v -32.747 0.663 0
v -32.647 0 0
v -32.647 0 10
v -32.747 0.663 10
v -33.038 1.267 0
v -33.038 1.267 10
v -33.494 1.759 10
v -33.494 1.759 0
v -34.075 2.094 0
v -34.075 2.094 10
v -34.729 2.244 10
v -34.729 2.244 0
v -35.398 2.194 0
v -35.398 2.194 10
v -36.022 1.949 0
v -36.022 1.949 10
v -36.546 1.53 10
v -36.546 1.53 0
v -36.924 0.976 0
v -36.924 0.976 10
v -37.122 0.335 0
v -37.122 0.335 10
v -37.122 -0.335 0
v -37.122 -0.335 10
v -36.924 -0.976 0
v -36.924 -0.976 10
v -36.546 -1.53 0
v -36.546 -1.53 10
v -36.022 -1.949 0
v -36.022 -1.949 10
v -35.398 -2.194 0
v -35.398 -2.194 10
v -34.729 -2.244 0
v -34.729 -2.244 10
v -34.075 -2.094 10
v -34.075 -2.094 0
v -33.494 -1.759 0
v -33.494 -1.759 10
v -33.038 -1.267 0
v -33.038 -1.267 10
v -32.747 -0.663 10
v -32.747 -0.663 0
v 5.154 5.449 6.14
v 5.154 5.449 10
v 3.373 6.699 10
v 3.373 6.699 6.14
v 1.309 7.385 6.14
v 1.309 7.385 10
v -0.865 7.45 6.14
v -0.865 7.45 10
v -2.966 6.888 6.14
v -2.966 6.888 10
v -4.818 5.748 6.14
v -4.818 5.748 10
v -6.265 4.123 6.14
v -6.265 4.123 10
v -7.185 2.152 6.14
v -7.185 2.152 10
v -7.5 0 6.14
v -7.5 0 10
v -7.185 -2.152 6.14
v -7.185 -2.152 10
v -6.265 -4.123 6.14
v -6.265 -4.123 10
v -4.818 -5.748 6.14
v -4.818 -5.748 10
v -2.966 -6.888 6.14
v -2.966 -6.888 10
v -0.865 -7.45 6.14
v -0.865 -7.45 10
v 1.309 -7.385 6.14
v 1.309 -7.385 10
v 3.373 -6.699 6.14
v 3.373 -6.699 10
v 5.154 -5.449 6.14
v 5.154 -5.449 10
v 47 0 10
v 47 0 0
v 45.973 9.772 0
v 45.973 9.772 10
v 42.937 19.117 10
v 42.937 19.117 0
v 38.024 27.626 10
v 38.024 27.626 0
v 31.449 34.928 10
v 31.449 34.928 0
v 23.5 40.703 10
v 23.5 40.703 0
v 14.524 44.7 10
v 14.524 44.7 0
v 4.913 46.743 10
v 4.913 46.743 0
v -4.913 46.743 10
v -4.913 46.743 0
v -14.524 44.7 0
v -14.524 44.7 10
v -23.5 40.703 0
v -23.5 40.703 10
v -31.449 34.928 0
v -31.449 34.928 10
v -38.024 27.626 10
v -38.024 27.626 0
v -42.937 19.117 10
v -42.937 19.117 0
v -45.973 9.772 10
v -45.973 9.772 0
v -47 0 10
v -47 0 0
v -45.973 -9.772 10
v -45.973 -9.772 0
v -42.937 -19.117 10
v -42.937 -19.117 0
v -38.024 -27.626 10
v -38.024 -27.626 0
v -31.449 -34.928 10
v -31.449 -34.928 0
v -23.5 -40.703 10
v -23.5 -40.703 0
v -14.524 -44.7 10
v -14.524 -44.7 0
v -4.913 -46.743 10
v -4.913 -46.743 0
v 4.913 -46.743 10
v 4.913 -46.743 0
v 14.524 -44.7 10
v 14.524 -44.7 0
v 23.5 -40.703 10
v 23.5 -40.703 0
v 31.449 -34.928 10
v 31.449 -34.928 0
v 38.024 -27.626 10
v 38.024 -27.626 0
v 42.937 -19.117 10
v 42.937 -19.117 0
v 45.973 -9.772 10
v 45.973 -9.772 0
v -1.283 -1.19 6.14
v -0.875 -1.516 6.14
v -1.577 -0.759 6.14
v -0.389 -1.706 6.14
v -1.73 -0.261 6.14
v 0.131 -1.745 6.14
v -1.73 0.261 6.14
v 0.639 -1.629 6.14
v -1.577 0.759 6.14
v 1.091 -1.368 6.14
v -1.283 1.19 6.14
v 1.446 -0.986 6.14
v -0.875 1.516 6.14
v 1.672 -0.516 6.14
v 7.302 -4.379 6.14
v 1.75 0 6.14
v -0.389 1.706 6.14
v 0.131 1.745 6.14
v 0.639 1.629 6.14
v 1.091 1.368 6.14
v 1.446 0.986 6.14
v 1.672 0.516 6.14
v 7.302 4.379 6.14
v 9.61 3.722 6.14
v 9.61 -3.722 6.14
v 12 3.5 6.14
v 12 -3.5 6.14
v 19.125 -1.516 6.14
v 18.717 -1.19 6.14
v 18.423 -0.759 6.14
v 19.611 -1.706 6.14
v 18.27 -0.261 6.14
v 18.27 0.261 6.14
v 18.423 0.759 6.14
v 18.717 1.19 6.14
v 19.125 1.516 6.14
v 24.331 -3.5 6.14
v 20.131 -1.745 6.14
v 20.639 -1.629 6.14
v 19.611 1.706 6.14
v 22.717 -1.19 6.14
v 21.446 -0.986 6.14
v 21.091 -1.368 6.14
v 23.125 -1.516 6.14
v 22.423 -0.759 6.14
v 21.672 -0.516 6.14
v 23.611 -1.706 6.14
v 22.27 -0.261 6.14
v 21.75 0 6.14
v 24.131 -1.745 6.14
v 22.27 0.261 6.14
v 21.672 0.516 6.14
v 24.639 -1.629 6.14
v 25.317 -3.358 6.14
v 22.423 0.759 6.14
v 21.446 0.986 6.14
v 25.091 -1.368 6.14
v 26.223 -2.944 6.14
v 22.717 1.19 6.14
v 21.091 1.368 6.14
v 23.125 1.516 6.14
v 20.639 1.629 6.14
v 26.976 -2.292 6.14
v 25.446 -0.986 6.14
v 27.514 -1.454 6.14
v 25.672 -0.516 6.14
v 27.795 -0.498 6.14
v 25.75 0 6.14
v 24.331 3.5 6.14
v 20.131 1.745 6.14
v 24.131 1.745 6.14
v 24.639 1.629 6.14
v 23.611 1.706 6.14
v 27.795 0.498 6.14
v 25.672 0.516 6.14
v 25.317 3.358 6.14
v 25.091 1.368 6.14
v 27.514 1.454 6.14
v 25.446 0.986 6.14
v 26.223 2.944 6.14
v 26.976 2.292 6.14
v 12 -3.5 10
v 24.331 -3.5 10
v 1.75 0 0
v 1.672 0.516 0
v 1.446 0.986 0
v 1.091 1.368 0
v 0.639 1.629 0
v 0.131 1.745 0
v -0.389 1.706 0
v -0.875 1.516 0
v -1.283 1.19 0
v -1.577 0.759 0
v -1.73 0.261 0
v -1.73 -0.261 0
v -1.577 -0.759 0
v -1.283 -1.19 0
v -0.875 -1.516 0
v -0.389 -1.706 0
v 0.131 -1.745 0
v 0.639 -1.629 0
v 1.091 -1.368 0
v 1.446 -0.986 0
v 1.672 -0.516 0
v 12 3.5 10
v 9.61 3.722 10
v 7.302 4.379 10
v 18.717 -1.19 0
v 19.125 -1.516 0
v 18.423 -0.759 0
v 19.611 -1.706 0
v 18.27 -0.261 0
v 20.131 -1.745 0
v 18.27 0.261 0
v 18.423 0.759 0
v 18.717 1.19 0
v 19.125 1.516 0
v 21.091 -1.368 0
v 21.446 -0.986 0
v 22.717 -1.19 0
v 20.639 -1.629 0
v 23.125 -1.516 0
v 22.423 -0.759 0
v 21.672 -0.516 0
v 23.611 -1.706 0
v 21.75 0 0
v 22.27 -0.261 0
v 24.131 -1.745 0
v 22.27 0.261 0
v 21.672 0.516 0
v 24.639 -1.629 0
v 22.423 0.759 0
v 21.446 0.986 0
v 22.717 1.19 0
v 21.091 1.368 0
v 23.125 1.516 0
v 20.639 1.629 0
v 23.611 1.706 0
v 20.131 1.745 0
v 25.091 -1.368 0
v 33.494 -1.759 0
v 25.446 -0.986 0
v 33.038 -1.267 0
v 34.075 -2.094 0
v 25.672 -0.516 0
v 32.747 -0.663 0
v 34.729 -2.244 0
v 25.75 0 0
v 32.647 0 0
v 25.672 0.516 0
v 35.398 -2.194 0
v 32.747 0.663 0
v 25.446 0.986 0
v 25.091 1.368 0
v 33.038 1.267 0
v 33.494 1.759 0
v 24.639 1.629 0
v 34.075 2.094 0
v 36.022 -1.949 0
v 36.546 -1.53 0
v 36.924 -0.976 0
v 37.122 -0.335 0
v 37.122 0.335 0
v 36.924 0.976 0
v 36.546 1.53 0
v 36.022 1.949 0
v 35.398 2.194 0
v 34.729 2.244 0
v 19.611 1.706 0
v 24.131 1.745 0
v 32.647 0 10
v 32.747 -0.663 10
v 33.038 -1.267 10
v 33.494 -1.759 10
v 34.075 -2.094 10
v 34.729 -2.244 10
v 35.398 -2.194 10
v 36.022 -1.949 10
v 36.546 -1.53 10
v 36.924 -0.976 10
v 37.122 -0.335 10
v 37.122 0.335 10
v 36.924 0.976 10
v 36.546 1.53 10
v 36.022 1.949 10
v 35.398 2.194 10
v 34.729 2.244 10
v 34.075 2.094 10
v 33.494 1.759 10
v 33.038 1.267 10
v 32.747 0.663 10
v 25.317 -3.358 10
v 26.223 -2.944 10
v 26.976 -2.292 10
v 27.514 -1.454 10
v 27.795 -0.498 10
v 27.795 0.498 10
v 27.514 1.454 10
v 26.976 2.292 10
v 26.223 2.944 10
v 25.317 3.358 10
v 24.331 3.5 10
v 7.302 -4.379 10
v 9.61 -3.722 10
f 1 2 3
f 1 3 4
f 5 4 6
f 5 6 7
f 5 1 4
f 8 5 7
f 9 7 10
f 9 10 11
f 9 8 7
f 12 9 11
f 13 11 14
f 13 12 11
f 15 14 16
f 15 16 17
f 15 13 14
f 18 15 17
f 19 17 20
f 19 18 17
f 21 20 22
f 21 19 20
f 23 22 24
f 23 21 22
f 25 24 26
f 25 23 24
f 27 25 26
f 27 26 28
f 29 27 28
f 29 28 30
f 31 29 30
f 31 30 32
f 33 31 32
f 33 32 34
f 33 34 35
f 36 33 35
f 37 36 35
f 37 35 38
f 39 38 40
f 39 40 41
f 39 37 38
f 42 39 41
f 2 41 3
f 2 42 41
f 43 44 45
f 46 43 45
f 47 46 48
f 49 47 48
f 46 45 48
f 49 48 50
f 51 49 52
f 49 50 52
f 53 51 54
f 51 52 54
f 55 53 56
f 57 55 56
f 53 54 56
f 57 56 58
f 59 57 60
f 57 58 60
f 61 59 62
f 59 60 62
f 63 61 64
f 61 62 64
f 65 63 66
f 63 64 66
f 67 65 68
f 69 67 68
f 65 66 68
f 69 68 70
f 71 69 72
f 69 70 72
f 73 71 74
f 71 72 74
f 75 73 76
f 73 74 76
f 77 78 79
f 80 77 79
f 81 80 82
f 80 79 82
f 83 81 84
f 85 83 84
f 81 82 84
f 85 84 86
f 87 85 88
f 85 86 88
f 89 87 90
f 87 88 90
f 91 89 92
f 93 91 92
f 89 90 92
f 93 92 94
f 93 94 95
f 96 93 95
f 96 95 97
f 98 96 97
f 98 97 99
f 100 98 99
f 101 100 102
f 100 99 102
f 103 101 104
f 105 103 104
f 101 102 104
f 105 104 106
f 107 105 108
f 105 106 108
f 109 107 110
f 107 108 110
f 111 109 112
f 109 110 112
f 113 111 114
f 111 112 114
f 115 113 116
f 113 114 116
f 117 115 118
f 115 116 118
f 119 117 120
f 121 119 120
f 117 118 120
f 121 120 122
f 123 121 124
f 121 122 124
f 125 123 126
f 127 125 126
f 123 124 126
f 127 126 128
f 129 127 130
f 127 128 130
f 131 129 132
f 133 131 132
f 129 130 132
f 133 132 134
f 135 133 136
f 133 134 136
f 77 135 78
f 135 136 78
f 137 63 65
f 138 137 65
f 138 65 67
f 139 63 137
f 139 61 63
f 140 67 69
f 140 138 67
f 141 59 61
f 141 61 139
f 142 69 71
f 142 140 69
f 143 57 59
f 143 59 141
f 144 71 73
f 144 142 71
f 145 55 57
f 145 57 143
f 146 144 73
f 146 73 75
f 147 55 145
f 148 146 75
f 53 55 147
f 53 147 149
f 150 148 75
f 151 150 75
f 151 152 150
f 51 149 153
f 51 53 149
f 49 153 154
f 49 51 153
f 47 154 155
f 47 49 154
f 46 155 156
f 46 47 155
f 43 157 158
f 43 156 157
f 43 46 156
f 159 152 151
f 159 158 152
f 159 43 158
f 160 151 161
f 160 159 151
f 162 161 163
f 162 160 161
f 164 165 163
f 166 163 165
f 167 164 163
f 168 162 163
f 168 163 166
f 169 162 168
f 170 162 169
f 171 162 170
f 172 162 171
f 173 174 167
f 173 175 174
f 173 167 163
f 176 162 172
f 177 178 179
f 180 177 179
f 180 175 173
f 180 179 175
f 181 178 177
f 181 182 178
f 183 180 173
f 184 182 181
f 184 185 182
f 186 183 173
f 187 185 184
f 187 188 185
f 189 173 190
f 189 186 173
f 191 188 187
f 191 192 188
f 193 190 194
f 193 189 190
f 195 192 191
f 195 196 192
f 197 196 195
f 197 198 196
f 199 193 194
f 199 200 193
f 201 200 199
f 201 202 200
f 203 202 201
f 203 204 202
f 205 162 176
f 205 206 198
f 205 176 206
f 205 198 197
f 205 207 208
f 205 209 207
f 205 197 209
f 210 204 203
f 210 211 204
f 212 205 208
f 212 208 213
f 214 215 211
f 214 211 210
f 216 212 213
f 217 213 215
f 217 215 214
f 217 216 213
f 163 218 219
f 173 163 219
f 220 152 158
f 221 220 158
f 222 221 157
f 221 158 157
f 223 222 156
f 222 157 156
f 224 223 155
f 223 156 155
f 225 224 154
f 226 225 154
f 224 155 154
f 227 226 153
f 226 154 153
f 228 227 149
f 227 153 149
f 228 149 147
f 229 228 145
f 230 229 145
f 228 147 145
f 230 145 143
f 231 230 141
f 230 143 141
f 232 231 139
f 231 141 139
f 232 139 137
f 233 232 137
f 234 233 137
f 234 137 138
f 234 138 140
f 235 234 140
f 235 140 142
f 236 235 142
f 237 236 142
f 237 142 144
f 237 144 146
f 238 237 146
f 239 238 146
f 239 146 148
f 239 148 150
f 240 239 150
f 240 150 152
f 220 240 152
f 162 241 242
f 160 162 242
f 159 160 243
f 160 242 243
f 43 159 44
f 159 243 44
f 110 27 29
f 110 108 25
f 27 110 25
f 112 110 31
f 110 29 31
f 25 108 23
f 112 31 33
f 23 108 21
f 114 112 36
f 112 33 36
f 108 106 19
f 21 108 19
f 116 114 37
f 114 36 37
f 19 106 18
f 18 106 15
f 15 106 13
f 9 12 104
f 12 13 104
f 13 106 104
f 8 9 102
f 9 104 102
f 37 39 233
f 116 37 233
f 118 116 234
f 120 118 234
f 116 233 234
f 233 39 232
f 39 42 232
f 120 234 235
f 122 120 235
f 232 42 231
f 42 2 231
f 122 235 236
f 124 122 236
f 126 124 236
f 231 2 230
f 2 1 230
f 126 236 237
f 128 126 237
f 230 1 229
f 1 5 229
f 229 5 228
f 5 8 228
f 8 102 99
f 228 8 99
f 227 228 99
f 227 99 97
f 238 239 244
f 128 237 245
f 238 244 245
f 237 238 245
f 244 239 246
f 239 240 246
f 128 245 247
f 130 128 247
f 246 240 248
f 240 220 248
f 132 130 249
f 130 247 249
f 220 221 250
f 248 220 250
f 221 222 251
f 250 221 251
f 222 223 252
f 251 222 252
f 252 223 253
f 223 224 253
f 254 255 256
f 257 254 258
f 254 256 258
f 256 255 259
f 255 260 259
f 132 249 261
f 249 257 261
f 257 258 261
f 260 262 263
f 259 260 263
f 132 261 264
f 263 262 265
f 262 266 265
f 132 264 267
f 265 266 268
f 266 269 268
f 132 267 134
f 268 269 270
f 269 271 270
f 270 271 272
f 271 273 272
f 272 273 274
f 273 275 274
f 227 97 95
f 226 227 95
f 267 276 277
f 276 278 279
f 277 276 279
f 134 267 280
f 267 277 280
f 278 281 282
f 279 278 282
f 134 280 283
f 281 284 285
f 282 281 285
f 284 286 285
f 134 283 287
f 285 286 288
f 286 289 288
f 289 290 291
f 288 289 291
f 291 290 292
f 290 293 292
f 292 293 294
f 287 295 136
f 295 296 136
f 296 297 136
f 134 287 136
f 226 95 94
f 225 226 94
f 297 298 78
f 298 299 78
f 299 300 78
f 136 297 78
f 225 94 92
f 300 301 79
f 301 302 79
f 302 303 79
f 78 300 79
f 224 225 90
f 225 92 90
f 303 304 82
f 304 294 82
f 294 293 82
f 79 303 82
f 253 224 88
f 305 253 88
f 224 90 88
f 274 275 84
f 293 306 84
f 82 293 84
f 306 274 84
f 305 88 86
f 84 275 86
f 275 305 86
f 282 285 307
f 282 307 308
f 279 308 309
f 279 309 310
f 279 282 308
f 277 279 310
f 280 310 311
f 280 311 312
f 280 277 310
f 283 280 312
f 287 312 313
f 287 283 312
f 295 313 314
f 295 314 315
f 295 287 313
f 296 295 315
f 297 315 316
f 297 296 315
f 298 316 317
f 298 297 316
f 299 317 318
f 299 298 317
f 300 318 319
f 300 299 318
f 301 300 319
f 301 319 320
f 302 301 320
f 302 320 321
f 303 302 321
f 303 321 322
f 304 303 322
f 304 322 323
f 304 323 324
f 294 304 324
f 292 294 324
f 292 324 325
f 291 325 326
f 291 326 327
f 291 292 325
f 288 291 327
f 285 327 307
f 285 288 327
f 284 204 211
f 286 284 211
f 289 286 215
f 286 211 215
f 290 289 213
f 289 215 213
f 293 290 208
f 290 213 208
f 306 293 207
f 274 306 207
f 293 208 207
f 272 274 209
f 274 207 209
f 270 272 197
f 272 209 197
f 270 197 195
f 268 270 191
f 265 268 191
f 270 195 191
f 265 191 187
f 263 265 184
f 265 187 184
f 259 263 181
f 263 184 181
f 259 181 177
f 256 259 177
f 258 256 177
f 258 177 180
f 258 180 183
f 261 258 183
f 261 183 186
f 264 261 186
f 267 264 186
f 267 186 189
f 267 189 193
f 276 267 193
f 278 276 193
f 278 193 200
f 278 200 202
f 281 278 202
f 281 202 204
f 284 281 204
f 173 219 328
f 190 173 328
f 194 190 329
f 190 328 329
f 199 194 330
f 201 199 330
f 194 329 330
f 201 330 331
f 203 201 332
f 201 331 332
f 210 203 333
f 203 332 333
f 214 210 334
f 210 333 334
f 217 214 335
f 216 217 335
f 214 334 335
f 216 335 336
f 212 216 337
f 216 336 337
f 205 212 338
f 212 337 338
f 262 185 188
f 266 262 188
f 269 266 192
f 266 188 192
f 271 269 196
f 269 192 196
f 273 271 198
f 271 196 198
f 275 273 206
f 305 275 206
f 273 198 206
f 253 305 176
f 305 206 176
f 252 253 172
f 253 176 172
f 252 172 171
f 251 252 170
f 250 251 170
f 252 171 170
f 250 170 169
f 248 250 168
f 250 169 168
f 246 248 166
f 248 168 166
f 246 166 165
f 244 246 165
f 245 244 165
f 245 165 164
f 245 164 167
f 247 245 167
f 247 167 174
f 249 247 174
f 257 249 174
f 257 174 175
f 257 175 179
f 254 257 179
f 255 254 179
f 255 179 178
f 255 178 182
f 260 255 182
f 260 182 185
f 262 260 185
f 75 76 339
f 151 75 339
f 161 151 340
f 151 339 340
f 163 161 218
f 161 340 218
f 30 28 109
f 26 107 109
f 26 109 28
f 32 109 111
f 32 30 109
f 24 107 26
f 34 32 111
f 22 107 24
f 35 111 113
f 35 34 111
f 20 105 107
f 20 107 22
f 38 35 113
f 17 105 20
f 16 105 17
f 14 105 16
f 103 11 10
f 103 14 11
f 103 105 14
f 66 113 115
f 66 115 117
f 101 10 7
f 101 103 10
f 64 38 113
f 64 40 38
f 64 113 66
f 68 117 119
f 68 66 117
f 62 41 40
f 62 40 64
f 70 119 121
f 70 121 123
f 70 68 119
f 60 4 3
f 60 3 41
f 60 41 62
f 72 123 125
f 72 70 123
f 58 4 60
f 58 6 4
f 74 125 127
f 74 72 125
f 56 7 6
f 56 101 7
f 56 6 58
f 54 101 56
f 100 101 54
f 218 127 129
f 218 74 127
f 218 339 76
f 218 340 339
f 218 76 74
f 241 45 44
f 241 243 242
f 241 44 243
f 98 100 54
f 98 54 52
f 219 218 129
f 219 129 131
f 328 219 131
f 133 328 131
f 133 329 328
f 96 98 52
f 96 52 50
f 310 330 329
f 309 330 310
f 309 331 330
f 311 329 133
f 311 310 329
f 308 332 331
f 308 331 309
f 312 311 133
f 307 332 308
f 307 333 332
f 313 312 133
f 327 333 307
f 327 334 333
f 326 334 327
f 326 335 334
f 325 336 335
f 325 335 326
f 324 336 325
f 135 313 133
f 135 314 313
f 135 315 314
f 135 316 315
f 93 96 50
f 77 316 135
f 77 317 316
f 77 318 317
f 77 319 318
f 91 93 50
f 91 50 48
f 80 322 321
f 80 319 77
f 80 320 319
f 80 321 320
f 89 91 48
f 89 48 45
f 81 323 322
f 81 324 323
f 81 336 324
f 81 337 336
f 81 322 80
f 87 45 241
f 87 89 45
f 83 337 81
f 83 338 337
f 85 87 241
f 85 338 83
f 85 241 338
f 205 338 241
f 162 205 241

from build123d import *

# Parameters (mm, degrees)
SKETCH1_R           = 47
SKETCH1_R_2         = 2.25
BOSS_EXTRUDE1_DEPTH = 10
CUT_EXTRUDE1_DEPTH  = 3.86
SKETCH3_R           = 1.75
CUT_EXTRUDE2_DEPTH  = 67.751026958


with BuildPart() as part:
    # Sketch1 → Boss-Extrude1 (new body)
    with BuildSketch(Plane(origin=(0, 0, 0), x_dir=(0, 1, 0), z_dir=(0, 0, 1))):
        with Locations(Location((0, 0, 0), (0, 0, 270))):
            Circle(SKETCH1_R)
        with Locations(Location((0, 34.897005385, 0), (0, 0, 270))):
            Circle(SKETCH1_R_2, mode=Mode.SUBTRACT)
        with Locations(Location((0, -34.897005385, 0), (0, 0, 90))):
            Circle(SKETCH1_R_2, mode=Mode.SUBTRACT)
    extrude(amount=BOSS_EXTRUDE1_DEPTH)

    # Sketch2 → Cut-Extrude1 (cut)
    with BuildSketch(Plane.XY.offset(10)):
        with BuildLine():
            Line((24.33053856, 3.5), (12, 3.5))
            ThreePointArc((12, 3.5), (8.440790603, 3.996719292), (5.153570125, 5.448918697))
            ThreePointArc((5.153570125, 5.448918697), (-7.5, 0), (5.153570125, -5.448918697))
            ThreePointArc((5.153570125, -5.448918697), (8.440790603, -3.996719292), (12, -3.5))
            Line((12, -3.5), (24.33053856, -3.5))
            ThreePointArc((24.33053856, -3.5), (27.83053856, 0), (24.33053856, 3.5))
        make_face()
    extrude(amount=-CUT_EXTRUDE1_DEPTH, mode=Mode.SUBTRACT)

    # Sketch3 → Cut-Extrude2 (cut, through all)
    with BuildSketch(Plane.XY.offset(6.14)):
        Circle(SKETCH3_R)
        with Locations((20, 0)):
            Circle(SKETCH3_R)
        with Locations((24, 0)):
            Circle(SKETCH3_R)
    extrude(amount=-CUT_EXTRUDE2_DEPTH, mode=Mode.SUBTRACT)


solid = part.part
